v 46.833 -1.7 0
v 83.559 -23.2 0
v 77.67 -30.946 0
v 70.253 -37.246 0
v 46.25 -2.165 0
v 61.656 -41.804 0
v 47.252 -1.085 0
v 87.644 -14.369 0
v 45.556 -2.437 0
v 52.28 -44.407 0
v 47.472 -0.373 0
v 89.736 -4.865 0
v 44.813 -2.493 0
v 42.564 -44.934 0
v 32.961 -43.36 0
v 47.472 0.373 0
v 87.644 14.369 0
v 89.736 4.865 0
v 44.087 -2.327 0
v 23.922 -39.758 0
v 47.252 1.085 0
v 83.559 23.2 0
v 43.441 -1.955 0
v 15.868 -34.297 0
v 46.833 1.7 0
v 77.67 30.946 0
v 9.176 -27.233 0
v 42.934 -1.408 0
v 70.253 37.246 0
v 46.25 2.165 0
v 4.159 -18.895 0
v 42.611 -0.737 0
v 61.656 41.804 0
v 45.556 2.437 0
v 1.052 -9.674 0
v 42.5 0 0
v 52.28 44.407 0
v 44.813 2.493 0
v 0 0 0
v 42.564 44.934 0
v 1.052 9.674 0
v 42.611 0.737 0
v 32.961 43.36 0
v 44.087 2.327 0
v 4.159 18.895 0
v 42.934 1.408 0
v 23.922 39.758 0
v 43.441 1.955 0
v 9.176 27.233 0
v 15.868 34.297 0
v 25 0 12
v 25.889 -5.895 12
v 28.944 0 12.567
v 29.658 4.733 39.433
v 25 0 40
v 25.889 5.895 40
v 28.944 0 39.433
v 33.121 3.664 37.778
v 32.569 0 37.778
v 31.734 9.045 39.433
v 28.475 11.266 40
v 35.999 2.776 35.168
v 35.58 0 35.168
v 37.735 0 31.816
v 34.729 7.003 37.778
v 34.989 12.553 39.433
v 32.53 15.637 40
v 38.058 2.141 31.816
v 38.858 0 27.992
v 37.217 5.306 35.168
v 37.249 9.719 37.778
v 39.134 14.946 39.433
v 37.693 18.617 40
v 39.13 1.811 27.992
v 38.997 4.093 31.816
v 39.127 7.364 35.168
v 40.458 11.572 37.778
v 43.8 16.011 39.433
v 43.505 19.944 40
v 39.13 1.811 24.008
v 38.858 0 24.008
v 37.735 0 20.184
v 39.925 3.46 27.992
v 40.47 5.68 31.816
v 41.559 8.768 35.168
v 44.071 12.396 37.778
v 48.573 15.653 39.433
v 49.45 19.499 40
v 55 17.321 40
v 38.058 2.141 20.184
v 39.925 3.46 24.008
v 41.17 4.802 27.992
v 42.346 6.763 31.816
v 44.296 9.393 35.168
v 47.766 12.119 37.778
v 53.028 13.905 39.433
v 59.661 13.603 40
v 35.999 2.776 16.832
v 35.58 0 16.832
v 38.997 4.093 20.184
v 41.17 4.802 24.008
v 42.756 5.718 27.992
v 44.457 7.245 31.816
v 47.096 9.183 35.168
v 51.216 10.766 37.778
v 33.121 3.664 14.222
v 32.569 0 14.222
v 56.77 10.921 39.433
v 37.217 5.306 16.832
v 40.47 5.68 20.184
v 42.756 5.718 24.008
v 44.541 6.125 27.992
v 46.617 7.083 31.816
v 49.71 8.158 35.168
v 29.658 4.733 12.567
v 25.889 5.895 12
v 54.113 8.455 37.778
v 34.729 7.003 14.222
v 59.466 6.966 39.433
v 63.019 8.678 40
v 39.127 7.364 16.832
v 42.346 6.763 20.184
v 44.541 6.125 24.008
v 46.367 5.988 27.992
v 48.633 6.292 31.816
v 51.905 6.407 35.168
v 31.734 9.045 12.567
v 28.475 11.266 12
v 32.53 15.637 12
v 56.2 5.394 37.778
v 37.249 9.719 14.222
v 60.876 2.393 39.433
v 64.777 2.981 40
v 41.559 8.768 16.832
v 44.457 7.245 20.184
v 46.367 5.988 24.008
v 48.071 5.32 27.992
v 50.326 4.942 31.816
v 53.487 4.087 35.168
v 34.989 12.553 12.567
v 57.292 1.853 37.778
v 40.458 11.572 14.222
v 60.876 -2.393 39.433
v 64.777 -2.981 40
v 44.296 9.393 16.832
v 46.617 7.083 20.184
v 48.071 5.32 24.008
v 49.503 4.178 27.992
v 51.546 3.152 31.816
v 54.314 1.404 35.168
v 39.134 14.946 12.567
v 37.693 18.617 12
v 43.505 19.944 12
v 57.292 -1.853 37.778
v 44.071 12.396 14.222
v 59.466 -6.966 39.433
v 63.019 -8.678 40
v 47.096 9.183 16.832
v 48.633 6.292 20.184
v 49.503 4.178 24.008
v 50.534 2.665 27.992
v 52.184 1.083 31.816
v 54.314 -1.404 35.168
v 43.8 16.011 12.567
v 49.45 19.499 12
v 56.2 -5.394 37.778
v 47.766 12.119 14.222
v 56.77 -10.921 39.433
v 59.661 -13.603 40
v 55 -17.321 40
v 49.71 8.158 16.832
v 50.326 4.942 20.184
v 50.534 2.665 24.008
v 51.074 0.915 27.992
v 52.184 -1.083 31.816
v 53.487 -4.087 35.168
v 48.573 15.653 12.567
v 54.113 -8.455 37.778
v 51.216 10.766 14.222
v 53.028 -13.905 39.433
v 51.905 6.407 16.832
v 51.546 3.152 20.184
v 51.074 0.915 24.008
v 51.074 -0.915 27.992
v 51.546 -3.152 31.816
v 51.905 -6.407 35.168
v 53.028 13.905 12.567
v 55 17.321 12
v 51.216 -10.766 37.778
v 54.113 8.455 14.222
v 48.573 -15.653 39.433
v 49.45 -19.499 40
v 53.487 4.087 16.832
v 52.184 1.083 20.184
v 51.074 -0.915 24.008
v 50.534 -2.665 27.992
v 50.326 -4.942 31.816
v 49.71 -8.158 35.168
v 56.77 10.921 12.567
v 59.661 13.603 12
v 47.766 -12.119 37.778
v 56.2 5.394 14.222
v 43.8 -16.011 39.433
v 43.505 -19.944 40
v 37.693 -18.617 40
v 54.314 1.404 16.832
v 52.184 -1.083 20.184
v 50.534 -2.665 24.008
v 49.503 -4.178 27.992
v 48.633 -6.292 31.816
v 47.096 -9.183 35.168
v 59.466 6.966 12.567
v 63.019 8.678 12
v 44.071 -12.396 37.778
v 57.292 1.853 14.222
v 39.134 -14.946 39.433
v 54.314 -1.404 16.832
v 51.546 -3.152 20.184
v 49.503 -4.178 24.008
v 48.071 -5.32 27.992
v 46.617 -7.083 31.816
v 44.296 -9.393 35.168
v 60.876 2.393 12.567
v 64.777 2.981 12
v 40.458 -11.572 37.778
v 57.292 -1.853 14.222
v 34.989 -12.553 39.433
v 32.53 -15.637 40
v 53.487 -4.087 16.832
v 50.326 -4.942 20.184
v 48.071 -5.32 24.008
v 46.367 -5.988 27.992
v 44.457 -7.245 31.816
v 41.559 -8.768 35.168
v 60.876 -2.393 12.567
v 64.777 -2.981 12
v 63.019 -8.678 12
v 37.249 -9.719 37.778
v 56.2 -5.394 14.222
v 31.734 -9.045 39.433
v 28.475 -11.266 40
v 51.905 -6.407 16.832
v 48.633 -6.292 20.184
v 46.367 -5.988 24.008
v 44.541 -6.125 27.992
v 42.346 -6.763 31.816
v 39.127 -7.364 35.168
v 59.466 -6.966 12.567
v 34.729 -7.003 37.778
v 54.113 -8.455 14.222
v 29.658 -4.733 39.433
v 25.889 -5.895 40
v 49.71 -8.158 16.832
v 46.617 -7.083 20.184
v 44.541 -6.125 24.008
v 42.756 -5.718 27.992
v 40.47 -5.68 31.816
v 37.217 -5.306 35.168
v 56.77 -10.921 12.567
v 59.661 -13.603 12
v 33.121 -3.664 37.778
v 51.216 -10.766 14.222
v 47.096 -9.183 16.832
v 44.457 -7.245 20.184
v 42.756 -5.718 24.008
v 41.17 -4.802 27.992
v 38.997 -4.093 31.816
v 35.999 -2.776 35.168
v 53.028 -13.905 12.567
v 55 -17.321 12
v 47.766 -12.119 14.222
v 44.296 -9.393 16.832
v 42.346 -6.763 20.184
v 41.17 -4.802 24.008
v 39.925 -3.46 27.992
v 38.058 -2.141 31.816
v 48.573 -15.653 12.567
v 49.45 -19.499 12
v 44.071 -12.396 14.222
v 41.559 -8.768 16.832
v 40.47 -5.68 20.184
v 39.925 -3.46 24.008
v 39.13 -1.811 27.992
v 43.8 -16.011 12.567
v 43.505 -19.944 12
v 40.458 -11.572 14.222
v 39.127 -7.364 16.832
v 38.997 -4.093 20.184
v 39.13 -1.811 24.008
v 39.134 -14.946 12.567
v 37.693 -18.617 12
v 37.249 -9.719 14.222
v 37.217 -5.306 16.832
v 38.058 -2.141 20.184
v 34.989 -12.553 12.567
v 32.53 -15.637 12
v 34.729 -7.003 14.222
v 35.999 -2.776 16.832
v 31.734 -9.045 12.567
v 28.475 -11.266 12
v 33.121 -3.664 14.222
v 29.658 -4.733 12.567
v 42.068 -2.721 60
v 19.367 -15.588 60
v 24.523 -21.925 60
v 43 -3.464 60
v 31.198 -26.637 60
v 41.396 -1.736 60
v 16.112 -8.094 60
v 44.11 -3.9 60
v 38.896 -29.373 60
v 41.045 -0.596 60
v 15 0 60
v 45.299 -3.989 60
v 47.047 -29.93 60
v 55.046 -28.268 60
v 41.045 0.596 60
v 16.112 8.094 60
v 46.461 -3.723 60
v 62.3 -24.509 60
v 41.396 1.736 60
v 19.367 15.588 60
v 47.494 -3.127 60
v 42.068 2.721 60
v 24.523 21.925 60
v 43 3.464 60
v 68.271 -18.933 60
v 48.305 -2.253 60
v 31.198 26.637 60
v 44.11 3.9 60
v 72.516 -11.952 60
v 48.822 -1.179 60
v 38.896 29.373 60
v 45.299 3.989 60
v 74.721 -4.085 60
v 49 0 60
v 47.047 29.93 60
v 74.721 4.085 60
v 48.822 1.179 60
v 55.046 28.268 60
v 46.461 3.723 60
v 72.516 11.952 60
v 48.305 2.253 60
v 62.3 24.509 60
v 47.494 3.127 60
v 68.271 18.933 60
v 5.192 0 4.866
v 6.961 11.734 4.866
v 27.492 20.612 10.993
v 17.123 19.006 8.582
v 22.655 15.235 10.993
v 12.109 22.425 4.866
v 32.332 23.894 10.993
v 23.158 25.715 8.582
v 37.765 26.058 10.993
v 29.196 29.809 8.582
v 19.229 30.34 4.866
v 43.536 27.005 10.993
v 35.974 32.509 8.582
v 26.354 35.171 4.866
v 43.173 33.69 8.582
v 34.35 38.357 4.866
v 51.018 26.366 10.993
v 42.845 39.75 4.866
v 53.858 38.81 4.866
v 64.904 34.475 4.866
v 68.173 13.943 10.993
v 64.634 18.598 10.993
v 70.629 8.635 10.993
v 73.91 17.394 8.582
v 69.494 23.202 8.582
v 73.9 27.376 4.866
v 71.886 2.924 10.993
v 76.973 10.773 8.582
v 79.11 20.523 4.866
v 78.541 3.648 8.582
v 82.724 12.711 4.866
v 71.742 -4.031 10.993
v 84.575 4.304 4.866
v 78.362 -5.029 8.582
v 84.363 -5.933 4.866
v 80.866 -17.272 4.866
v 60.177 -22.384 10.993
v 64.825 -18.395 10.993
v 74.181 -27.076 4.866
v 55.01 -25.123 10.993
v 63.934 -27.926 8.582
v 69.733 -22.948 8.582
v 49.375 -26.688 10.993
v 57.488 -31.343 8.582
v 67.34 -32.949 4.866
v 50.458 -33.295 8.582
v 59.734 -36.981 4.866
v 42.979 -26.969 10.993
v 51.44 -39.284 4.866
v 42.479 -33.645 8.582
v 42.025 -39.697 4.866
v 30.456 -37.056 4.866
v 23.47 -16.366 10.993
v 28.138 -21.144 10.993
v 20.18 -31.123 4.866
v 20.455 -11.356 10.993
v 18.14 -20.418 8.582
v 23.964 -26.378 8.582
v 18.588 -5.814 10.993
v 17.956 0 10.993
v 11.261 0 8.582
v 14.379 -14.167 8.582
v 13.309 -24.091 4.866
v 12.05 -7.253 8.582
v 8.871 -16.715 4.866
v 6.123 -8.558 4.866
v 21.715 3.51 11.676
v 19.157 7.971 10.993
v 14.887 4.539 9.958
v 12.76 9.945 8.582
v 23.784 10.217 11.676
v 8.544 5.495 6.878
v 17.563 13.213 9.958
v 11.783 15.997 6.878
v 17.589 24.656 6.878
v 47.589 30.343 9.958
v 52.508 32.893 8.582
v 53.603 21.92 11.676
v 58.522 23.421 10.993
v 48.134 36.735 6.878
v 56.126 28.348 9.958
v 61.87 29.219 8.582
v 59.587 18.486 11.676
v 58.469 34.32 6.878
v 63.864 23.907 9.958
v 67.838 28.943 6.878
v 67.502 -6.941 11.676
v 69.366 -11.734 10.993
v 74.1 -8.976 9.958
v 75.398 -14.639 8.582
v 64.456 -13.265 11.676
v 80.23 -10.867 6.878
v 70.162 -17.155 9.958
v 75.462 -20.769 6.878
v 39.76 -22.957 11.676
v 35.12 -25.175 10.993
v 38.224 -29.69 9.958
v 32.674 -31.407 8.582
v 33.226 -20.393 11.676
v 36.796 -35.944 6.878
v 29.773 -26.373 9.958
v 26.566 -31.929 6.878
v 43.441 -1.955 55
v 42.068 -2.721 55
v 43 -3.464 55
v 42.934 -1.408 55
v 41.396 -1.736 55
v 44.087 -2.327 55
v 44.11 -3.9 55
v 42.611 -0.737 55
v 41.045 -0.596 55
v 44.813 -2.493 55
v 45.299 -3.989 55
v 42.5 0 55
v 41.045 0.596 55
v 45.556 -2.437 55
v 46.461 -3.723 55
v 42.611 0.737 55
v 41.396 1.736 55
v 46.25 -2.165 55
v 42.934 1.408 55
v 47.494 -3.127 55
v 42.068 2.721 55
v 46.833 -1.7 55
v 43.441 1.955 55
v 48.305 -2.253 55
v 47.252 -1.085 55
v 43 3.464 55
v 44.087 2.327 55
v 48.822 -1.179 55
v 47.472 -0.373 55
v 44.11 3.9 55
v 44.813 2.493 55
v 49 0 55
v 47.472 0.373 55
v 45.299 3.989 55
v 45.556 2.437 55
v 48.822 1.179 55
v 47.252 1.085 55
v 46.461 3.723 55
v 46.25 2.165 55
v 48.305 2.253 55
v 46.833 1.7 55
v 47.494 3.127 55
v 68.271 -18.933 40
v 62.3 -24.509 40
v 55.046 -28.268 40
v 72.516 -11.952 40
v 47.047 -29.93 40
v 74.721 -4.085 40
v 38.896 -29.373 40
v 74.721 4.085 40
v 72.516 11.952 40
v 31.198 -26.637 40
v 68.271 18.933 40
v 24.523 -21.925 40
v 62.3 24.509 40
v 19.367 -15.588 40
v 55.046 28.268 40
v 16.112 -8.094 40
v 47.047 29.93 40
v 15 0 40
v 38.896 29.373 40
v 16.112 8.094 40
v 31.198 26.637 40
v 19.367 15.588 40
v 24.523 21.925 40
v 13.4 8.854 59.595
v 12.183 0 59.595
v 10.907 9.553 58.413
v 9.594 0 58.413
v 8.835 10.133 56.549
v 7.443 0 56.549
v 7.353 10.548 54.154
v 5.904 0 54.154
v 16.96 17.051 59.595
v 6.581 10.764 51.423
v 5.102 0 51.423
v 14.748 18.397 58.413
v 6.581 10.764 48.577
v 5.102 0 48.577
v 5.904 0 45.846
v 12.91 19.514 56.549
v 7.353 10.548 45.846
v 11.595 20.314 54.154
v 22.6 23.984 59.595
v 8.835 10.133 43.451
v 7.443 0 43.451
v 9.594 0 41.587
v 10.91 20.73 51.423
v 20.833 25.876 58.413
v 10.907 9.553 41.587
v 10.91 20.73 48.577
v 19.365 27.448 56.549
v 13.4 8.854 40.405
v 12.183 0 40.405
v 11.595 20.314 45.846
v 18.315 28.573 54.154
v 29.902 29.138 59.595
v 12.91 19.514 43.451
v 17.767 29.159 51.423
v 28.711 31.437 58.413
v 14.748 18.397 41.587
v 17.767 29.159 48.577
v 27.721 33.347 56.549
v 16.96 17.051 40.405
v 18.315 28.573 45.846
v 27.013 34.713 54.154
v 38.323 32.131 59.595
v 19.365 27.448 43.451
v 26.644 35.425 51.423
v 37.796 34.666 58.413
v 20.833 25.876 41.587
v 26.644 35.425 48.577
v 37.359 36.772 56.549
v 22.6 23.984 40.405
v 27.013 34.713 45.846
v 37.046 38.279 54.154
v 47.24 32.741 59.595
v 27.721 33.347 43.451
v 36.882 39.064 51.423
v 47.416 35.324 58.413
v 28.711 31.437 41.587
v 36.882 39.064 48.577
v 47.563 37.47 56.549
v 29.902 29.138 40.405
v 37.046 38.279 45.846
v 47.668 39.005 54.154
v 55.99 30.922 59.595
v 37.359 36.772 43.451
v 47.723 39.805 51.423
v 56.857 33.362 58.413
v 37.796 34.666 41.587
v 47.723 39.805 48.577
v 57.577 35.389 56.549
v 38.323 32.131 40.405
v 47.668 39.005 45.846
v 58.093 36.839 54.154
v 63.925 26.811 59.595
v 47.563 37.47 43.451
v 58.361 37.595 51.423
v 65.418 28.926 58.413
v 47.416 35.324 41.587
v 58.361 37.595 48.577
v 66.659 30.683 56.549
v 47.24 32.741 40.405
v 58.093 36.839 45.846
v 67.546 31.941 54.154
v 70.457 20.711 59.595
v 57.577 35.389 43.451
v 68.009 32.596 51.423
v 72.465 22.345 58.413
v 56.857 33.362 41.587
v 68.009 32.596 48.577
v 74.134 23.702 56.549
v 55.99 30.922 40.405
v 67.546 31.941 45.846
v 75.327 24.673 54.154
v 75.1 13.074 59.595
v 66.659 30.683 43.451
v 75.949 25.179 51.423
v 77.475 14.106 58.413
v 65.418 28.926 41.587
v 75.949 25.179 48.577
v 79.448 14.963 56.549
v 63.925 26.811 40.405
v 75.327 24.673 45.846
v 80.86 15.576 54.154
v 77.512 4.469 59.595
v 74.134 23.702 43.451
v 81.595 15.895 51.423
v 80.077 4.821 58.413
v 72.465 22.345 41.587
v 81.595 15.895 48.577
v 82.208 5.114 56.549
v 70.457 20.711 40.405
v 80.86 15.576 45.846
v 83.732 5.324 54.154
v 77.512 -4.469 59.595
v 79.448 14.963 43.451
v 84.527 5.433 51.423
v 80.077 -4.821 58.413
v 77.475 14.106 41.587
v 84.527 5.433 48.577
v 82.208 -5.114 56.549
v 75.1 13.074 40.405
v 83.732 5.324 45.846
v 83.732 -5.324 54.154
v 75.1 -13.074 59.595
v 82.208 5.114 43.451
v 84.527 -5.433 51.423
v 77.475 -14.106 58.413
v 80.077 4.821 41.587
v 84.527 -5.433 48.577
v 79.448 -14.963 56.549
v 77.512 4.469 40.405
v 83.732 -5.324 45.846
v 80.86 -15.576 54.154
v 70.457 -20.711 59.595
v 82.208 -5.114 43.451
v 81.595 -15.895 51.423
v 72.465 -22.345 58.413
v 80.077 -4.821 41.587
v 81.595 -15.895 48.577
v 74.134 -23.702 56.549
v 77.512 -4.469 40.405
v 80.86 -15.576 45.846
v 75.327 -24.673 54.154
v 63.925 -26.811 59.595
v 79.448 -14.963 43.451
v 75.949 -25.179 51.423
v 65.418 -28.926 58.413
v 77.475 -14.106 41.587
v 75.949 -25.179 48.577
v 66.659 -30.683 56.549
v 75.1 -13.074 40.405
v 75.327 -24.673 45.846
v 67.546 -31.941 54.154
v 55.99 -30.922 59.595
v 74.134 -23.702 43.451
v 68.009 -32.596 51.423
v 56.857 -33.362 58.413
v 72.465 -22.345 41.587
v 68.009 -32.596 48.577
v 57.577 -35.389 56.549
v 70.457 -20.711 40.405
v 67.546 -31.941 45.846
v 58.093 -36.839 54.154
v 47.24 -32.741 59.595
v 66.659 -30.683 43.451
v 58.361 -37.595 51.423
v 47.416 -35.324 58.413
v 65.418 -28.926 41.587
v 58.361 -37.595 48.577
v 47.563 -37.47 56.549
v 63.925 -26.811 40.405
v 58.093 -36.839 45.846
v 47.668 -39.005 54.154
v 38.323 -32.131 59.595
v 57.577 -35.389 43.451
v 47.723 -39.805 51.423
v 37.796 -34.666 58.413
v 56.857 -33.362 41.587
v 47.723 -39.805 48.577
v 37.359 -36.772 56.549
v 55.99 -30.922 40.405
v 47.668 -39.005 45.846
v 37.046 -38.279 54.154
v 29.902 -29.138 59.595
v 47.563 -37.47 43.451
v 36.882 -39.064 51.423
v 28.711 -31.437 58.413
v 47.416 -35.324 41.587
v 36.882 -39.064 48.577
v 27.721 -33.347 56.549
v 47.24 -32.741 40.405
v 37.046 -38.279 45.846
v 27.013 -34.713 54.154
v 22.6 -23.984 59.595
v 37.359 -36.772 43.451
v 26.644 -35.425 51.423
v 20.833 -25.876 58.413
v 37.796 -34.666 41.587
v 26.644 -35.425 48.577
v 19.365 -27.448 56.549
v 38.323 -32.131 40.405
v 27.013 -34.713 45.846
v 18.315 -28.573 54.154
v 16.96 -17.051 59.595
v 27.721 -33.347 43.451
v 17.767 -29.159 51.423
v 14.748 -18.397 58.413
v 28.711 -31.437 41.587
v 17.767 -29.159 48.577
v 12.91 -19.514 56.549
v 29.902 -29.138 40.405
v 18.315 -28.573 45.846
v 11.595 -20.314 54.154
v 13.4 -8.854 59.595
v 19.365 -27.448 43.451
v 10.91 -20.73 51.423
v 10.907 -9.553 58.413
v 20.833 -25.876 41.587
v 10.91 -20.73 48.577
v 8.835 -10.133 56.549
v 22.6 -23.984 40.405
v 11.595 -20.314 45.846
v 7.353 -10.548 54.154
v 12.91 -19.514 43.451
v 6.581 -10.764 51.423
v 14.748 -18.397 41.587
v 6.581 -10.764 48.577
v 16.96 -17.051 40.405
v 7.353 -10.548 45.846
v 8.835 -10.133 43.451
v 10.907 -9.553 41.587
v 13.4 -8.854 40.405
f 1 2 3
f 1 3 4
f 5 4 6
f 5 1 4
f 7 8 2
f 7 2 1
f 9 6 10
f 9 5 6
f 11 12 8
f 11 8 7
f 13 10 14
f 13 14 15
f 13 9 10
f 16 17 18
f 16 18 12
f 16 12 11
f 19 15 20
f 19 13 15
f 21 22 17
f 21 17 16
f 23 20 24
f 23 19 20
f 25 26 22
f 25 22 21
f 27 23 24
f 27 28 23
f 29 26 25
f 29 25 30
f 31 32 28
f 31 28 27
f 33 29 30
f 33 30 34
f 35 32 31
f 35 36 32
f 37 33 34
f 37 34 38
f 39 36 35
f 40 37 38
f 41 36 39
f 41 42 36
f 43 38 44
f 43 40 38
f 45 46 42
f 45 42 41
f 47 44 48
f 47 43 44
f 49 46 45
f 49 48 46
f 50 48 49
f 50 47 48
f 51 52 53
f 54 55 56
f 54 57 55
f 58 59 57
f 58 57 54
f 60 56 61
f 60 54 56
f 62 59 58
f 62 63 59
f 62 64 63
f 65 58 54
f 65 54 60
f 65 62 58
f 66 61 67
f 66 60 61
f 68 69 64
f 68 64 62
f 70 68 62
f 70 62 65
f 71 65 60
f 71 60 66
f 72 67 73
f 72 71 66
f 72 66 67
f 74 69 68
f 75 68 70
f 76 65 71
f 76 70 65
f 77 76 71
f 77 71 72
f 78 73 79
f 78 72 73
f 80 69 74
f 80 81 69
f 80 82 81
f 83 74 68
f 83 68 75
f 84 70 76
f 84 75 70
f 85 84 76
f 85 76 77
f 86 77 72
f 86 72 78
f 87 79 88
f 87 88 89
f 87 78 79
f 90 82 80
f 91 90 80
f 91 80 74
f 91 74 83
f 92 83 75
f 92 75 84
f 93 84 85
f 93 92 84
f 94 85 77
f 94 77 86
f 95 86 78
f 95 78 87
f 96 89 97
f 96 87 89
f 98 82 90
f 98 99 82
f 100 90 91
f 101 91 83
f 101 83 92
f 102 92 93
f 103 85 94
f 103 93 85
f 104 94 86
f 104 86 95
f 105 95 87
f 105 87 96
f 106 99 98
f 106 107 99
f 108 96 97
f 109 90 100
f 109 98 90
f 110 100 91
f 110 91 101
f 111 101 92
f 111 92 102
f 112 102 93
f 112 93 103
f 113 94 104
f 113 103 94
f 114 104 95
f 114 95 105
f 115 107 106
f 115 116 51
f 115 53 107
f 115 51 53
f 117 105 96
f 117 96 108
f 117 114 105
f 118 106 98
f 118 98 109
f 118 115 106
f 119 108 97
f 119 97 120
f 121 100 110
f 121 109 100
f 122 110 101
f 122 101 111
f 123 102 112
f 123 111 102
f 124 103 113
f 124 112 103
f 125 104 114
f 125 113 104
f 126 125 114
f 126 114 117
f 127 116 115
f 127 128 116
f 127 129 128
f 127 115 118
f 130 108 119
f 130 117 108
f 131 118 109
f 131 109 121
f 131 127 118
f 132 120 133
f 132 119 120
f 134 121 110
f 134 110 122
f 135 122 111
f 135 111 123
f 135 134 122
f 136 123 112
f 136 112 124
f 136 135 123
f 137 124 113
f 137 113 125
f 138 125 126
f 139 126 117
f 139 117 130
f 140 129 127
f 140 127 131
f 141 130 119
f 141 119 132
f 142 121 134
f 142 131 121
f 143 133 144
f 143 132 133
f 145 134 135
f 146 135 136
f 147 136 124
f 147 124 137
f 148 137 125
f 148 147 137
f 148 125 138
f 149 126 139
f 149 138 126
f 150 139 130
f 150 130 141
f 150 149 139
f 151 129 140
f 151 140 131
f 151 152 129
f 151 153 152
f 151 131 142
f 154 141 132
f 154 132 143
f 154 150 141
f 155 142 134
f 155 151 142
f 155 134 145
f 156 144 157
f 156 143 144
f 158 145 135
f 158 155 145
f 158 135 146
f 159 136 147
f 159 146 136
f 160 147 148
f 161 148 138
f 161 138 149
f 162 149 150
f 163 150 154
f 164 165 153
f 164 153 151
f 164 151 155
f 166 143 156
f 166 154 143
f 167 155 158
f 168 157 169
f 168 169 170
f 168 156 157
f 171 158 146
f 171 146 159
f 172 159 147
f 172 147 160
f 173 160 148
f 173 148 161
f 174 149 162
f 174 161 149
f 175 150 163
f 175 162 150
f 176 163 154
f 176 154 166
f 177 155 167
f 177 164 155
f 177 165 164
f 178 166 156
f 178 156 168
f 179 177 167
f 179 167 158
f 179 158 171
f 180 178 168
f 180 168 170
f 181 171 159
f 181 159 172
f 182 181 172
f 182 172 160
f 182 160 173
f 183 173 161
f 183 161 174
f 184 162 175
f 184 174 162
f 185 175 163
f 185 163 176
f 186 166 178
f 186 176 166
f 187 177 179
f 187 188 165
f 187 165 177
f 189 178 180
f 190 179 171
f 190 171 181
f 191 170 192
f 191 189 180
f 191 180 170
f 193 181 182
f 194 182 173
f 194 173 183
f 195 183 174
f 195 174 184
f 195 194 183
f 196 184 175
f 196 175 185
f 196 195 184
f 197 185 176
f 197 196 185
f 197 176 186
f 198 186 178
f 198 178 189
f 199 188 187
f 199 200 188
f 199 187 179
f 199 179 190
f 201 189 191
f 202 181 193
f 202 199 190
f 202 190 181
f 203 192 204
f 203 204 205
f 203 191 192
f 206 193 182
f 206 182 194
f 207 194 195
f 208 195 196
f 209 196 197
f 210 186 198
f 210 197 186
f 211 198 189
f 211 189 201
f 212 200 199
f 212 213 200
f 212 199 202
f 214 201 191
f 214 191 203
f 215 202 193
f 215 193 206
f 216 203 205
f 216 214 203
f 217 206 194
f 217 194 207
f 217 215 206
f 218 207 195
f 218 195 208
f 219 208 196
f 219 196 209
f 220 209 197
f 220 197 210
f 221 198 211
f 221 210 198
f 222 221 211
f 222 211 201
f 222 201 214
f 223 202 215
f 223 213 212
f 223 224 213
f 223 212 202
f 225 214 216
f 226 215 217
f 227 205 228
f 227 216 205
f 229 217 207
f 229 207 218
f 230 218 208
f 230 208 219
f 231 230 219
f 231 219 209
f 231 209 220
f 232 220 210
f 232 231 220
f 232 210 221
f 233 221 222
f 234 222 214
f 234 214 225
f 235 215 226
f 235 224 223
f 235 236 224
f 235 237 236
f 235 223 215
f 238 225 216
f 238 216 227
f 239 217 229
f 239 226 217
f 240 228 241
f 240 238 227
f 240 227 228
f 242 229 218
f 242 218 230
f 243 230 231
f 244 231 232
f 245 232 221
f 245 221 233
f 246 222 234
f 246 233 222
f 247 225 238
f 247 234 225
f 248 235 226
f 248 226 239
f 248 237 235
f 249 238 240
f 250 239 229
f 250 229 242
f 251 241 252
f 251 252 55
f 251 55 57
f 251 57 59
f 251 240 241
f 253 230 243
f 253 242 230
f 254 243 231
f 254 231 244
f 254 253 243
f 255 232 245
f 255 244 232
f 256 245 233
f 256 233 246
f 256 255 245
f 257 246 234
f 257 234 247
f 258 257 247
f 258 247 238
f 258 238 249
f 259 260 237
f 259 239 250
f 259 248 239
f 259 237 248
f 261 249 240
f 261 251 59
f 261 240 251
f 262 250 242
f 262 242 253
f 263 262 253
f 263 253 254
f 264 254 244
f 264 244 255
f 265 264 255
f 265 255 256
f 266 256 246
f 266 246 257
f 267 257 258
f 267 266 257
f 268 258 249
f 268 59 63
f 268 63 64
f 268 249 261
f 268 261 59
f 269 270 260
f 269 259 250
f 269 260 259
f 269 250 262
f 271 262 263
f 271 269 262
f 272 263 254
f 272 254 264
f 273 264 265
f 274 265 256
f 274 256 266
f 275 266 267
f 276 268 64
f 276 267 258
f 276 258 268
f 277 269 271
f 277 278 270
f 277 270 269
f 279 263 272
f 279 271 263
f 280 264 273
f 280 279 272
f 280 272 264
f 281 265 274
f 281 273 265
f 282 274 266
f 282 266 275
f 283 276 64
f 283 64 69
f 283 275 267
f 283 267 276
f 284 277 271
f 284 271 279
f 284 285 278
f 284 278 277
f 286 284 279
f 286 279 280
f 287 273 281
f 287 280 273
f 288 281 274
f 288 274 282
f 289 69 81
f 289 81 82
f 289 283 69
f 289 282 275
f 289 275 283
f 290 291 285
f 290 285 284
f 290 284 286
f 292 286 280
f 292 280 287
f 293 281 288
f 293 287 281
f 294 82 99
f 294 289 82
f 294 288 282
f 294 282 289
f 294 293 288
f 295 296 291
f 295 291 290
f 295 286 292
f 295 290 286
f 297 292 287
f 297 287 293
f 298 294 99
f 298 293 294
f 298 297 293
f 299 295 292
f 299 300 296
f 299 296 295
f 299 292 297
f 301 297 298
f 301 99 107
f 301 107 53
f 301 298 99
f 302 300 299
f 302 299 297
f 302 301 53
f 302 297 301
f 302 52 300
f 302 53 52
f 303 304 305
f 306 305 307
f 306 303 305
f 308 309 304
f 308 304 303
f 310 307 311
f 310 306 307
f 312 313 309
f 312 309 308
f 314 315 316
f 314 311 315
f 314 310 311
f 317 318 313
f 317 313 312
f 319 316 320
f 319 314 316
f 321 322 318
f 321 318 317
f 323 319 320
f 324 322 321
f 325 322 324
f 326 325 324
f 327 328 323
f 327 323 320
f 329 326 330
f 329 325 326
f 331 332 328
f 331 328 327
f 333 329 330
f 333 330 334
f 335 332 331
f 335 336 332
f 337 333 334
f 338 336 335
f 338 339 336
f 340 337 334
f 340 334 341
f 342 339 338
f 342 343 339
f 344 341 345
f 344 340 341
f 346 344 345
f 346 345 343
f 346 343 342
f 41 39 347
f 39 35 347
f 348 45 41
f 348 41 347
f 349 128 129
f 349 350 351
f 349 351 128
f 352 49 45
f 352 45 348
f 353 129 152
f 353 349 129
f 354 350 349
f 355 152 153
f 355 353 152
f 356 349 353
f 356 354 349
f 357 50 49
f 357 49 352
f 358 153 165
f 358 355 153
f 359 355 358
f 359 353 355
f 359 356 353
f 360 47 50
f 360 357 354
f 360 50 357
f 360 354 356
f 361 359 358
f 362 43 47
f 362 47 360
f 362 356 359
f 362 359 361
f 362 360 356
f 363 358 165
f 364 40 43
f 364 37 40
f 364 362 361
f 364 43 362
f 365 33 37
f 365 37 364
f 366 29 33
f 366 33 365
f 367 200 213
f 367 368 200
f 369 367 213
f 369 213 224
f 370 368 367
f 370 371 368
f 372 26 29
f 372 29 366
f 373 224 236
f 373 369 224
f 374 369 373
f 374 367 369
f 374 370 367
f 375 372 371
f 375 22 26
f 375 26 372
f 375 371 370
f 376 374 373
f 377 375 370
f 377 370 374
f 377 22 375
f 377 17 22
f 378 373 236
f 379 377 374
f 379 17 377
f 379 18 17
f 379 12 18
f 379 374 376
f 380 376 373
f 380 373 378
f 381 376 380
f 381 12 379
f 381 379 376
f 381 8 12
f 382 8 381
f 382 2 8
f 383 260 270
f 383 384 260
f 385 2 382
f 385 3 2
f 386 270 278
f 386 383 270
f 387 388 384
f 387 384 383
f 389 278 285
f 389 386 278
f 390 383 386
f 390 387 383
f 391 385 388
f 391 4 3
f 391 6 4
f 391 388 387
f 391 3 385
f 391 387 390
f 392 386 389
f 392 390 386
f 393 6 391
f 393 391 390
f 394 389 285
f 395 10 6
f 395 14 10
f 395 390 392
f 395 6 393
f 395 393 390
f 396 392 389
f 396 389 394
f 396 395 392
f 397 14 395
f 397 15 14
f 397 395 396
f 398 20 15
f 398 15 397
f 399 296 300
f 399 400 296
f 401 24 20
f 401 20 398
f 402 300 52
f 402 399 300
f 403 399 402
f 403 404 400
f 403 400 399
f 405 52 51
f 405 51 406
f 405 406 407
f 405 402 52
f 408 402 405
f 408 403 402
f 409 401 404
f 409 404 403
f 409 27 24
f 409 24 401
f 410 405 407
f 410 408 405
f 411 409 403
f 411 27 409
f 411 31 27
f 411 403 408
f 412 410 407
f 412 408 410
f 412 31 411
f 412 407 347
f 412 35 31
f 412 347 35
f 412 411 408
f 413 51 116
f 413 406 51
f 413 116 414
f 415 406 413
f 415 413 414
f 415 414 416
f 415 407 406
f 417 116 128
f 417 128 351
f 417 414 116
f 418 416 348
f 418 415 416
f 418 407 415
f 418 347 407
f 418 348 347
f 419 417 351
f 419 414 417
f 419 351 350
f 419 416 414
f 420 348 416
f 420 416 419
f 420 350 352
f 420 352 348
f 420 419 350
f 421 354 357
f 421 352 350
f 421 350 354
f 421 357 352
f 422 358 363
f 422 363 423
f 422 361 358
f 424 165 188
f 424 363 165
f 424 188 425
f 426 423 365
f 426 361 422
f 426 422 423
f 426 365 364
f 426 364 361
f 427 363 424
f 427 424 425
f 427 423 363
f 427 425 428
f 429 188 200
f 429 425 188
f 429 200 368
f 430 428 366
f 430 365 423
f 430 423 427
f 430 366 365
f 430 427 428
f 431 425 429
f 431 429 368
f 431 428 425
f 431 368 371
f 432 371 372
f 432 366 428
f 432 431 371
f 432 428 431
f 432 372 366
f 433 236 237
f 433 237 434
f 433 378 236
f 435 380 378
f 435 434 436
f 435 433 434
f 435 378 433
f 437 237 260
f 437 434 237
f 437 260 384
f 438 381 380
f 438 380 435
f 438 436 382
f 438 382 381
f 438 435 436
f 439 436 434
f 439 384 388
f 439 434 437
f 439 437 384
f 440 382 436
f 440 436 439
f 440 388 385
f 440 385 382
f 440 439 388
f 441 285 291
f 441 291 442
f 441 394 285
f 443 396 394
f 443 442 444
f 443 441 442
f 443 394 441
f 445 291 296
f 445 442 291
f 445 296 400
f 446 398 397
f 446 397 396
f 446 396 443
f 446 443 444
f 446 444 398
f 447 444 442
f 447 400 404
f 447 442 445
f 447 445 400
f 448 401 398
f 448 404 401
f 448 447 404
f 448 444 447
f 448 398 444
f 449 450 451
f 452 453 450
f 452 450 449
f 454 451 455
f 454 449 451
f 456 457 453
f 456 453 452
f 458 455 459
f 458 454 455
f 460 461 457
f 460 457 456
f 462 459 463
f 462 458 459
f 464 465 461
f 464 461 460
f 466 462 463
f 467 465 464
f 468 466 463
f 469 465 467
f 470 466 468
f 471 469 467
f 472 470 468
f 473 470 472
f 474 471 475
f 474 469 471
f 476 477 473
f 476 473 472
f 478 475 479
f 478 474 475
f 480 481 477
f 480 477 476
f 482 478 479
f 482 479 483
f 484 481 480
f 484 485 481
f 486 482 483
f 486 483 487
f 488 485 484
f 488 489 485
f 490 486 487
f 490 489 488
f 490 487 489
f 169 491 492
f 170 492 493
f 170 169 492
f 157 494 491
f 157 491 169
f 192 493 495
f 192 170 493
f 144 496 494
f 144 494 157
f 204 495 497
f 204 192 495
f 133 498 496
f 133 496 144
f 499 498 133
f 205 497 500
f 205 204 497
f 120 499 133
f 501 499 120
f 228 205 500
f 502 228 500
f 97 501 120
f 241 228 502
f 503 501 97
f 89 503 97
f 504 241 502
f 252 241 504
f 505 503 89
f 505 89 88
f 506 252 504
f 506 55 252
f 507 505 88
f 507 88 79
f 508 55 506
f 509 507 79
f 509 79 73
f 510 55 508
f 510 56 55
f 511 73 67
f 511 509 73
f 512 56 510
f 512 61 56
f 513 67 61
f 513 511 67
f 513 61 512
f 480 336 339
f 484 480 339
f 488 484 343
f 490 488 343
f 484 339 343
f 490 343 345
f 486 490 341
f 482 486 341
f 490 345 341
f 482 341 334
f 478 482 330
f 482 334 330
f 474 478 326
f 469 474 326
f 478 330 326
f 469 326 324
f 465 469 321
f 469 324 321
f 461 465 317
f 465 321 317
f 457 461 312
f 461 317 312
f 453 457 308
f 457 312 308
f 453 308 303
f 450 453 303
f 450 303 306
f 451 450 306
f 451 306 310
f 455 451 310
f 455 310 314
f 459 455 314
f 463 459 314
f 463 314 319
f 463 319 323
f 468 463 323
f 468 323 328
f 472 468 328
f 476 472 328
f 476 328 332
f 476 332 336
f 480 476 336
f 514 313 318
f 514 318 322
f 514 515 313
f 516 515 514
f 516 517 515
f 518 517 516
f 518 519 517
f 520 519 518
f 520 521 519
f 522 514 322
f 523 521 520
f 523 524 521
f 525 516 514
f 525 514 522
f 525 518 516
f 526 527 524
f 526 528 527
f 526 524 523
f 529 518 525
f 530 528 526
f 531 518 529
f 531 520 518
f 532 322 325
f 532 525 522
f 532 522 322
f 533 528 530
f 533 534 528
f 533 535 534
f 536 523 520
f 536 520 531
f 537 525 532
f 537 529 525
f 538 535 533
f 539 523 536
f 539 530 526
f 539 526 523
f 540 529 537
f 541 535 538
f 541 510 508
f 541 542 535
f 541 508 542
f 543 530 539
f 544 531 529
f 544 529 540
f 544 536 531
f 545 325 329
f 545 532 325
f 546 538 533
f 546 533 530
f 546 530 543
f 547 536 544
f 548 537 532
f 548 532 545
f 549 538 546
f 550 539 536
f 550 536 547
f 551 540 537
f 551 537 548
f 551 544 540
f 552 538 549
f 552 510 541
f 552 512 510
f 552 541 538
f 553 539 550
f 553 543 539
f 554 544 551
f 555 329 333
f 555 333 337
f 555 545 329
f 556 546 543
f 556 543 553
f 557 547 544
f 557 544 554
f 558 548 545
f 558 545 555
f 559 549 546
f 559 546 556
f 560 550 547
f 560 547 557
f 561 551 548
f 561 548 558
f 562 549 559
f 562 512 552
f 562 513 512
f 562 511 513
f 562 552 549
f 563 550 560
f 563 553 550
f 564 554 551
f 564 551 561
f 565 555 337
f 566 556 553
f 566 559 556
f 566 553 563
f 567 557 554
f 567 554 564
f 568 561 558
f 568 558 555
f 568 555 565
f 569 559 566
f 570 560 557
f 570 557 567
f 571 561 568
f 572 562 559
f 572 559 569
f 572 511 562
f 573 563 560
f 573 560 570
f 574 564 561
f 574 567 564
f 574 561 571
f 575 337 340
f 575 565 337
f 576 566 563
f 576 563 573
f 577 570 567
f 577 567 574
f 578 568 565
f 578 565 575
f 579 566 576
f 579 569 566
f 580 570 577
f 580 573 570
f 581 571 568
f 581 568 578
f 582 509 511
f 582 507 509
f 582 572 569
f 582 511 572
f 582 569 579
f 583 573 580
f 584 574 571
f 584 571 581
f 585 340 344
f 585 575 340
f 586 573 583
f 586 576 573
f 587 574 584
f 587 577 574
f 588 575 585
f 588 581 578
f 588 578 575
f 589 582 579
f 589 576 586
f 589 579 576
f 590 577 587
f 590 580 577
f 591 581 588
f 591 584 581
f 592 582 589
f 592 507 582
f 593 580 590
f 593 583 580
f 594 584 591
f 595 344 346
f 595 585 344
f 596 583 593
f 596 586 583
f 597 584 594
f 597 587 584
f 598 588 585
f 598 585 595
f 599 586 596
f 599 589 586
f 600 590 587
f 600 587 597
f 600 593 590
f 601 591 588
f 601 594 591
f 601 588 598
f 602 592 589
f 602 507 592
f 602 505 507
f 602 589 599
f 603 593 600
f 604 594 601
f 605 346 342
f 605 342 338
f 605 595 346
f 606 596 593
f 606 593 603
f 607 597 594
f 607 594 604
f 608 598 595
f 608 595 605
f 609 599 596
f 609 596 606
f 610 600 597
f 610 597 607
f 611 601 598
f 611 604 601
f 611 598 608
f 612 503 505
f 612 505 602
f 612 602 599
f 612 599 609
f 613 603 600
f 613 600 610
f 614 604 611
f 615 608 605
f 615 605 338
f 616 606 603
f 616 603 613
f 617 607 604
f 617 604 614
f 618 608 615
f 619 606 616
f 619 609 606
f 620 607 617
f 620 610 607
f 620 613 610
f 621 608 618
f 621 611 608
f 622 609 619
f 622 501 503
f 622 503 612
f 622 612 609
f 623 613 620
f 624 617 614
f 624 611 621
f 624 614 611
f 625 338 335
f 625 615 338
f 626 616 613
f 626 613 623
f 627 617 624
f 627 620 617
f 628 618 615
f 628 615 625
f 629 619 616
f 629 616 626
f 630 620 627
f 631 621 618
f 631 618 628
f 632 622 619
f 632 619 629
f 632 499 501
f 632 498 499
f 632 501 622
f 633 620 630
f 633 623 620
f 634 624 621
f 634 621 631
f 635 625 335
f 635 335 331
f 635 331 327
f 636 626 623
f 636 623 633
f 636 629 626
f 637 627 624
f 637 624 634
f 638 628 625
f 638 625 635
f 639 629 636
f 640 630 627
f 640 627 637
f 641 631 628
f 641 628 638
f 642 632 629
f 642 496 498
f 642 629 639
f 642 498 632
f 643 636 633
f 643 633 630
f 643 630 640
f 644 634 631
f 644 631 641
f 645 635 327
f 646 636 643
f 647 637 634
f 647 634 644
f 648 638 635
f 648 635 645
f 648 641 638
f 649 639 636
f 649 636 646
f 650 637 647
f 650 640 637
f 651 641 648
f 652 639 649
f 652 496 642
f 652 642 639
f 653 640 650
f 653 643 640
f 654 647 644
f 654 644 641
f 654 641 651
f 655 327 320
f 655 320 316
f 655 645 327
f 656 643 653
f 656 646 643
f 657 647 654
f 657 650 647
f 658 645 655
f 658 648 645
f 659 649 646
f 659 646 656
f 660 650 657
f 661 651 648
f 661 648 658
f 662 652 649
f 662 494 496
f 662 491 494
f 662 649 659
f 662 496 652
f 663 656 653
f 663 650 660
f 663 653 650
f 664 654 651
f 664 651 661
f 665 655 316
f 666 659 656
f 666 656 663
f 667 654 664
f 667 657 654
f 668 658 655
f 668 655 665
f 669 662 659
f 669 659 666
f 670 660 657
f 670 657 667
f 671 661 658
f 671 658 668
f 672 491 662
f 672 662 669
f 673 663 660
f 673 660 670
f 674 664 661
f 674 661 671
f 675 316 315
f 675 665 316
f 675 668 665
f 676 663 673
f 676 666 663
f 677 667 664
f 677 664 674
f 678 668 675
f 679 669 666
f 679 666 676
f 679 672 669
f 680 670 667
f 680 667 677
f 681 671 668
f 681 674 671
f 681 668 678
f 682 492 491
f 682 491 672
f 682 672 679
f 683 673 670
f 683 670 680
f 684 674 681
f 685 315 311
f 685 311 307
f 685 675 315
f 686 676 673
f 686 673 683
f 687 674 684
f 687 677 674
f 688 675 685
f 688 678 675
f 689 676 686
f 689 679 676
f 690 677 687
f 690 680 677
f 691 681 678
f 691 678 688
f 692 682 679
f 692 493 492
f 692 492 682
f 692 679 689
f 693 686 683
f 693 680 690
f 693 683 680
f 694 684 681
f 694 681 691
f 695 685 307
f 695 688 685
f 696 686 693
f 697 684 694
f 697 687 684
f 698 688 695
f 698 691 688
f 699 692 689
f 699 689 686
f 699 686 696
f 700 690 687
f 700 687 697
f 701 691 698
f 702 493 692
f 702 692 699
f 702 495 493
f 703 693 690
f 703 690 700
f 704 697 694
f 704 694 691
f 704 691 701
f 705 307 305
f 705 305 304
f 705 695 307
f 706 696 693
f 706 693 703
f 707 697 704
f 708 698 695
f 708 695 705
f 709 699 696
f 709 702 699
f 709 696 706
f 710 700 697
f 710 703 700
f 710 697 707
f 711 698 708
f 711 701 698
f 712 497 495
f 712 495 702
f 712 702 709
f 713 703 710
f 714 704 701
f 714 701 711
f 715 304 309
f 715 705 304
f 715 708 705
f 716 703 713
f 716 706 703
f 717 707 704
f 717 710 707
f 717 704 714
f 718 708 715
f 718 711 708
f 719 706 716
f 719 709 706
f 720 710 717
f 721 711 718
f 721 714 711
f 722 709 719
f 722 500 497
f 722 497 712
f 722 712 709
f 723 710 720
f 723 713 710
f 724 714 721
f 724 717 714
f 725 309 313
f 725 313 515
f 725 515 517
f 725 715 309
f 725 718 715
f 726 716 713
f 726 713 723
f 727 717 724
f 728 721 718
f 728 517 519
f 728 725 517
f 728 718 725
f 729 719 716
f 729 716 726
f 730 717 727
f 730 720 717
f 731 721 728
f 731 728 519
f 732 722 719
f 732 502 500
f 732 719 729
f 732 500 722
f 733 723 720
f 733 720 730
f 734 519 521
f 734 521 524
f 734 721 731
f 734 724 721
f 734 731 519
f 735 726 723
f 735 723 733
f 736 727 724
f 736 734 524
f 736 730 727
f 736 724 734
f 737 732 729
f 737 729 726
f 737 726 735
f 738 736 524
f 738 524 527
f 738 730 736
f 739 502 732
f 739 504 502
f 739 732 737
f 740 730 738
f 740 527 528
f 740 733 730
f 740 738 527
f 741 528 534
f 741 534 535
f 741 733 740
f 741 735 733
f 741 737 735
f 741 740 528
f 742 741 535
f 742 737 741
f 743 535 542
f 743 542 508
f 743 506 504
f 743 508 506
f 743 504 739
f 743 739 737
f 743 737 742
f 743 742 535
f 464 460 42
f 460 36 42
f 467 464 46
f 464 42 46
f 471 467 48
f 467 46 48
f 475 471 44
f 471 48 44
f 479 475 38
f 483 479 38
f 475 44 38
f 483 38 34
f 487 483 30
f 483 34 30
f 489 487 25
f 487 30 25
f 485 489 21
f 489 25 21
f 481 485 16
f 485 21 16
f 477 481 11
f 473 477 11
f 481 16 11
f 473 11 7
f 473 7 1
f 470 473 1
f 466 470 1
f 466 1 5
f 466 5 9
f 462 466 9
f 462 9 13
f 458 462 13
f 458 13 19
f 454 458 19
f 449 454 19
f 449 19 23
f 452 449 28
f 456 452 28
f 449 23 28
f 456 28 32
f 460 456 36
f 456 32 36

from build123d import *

# Parameters (mm, degrees)
F3_D           = 5
F3_CBORE_D     = 8
F3_CBORE_DEPTH = 5


with BuildPart() as f1:
    # F0 (on Front) → F1 (revolve)
    with BuildSketch(Plane.XZ):
        with BuildLine():
            ThreePointArc((25, 40), (39, 26), (25, 12))
            ThreePointArc((25, 12), (11.260843, 8.581576), (0, 0))
            Line((0, 0), (45, 0))
            Line((45, 0), (45, 60))
            Line((45, 60), (15, 60))
            ThreePointArc((15, 60), (5, 50), (15, 40))
            Line((15, 40), (25, 40))
        make_face()
    revolve(axis=Axis((45, 0, 49.649602), (0, 0, -1)))

    # F3 (through all)
    with Locations(Plane.XY.offset(60)):
        with Locations((45, 0)):
            CounterBoreHole(F3_D / 2, F3_CBORE_D / 2, F3_CBORE_DEPTH)


solid = f1.part
